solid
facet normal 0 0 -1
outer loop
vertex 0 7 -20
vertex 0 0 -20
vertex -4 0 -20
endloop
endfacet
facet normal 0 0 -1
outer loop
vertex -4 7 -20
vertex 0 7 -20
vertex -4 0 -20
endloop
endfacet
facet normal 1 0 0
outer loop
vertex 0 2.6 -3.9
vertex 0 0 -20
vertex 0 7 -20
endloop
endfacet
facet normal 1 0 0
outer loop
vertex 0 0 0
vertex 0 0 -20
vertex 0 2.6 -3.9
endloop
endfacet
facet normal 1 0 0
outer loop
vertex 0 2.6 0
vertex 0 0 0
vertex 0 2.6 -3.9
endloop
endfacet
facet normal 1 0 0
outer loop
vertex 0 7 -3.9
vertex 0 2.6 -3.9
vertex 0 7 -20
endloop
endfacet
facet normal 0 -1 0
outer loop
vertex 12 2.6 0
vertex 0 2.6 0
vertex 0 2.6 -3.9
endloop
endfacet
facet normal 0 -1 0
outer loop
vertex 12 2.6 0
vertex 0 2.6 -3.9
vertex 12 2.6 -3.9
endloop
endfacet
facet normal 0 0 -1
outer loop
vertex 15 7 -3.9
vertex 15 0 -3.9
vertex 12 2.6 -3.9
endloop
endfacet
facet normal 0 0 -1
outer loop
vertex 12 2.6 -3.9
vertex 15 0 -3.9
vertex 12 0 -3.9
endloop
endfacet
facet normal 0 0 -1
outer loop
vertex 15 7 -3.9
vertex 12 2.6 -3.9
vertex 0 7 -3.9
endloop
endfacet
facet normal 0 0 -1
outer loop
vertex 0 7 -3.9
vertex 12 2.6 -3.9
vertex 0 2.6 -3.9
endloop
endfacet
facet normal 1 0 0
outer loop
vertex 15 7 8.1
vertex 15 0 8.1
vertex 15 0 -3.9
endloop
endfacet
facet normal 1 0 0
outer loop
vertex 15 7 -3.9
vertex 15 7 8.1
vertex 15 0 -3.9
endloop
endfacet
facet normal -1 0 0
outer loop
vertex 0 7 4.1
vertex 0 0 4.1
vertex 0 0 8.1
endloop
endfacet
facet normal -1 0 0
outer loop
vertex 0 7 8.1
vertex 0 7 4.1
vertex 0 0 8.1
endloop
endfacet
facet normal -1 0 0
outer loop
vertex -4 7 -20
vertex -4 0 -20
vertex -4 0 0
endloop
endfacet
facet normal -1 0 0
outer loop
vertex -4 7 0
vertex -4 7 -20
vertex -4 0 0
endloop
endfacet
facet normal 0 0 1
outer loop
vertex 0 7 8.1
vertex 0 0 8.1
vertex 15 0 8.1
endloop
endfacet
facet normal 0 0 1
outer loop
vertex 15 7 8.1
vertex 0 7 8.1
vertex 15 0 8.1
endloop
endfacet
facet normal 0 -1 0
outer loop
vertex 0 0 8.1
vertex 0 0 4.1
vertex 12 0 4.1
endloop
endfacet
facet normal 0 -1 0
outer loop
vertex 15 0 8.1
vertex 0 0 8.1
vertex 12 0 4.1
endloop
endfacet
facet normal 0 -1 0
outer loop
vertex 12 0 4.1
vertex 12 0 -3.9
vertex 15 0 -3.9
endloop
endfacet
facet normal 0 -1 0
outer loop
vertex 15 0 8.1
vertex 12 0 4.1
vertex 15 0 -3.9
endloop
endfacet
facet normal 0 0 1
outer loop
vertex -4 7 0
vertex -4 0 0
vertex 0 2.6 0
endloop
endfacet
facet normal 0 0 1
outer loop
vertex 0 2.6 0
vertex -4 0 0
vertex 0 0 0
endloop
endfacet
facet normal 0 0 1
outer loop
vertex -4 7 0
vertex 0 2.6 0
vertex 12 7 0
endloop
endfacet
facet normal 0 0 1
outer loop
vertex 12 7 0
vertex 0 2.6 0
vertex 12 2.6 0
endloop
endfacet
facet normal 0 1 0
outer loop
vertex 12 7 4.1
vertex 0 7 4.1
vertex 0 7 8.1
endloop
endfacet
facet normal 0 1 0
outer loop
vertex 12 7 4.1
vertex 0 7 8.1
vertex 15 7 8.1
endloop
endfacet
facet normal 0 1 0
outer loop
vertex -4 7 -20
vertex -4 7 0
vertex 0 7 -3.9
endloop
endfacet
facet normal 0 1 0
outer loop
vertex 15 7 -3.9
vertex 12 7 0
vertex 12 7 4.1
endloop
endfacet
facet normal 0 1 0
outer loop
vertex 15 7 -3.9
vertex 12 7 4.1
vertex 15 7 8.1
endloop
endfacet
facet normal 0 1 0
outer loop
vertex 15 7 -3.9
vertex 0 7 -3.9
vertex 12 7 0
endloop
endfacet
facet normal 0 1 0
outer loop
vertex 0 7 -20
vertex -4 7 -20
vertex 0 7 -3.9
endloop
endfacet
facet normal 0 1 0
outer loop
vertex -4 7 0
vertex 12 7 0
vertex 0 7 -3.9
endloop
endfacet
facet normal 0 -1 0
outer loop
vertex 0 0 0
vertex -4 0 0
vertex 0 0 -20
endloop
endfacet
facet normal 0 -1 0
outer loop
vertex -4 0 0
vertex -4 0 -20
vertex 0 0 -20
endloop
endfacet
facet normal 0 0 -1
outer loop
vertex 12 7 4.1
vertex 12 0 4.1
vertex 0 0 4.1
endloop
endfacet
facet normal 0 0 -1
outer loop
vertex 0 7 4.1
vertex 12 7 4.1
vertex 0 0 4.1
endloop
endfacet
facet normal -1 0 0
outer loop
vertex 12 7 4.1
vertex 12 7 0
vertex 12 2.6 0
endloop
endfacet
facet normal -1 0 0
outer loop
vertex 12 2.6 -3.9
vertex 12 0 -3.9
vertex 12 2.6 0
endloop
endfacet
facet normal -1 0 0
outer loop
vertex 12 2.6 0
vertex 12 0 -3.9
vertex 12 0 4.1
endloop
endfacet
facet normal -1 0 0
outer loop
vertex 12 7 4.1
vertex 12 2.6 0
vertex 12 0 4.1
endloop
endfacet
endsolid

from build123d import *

# Parameters (mm, degrees)
BOSS_EXTRUDE1_DEPTH = 7
SKETCH2_W           = 12
SKETCH2_H           = 2.6
CUT_EXTRUDE1_DEPTH  = 7


with BuildPart() as part:
    # Sketch1 → Boss-Extrude1 (new body)
    with BuildSketch(Plane(origin=(0, 0, 0), x_dir=(1, 0, 0), z_dir=(0, 1, 0))):
        Polygon((0, 0), (12, 0), (12, -4.1), (0, -4.1), (0, -8.1), (15, -8.1), (15, 3.9), (1.592592593, 3.9), (0, 3.9), (0, 20), (-4, 20), (-4, 0), align=None)
    extrude(amount=BOSS_EXTRUDE1_DEPTH)

    # Sketch2 → Cut-Extrude1 (cut)
    with BuildSketch(Plane.XY):
        with Locations((6, 1.3)):
            Rectangle(SKETCH2_W, SKETCH2_H)
    extrude(amount=-CUT_EXTRUDE1_DEPTH, mode=Mode.SUBTRACT)


solid = part.part
